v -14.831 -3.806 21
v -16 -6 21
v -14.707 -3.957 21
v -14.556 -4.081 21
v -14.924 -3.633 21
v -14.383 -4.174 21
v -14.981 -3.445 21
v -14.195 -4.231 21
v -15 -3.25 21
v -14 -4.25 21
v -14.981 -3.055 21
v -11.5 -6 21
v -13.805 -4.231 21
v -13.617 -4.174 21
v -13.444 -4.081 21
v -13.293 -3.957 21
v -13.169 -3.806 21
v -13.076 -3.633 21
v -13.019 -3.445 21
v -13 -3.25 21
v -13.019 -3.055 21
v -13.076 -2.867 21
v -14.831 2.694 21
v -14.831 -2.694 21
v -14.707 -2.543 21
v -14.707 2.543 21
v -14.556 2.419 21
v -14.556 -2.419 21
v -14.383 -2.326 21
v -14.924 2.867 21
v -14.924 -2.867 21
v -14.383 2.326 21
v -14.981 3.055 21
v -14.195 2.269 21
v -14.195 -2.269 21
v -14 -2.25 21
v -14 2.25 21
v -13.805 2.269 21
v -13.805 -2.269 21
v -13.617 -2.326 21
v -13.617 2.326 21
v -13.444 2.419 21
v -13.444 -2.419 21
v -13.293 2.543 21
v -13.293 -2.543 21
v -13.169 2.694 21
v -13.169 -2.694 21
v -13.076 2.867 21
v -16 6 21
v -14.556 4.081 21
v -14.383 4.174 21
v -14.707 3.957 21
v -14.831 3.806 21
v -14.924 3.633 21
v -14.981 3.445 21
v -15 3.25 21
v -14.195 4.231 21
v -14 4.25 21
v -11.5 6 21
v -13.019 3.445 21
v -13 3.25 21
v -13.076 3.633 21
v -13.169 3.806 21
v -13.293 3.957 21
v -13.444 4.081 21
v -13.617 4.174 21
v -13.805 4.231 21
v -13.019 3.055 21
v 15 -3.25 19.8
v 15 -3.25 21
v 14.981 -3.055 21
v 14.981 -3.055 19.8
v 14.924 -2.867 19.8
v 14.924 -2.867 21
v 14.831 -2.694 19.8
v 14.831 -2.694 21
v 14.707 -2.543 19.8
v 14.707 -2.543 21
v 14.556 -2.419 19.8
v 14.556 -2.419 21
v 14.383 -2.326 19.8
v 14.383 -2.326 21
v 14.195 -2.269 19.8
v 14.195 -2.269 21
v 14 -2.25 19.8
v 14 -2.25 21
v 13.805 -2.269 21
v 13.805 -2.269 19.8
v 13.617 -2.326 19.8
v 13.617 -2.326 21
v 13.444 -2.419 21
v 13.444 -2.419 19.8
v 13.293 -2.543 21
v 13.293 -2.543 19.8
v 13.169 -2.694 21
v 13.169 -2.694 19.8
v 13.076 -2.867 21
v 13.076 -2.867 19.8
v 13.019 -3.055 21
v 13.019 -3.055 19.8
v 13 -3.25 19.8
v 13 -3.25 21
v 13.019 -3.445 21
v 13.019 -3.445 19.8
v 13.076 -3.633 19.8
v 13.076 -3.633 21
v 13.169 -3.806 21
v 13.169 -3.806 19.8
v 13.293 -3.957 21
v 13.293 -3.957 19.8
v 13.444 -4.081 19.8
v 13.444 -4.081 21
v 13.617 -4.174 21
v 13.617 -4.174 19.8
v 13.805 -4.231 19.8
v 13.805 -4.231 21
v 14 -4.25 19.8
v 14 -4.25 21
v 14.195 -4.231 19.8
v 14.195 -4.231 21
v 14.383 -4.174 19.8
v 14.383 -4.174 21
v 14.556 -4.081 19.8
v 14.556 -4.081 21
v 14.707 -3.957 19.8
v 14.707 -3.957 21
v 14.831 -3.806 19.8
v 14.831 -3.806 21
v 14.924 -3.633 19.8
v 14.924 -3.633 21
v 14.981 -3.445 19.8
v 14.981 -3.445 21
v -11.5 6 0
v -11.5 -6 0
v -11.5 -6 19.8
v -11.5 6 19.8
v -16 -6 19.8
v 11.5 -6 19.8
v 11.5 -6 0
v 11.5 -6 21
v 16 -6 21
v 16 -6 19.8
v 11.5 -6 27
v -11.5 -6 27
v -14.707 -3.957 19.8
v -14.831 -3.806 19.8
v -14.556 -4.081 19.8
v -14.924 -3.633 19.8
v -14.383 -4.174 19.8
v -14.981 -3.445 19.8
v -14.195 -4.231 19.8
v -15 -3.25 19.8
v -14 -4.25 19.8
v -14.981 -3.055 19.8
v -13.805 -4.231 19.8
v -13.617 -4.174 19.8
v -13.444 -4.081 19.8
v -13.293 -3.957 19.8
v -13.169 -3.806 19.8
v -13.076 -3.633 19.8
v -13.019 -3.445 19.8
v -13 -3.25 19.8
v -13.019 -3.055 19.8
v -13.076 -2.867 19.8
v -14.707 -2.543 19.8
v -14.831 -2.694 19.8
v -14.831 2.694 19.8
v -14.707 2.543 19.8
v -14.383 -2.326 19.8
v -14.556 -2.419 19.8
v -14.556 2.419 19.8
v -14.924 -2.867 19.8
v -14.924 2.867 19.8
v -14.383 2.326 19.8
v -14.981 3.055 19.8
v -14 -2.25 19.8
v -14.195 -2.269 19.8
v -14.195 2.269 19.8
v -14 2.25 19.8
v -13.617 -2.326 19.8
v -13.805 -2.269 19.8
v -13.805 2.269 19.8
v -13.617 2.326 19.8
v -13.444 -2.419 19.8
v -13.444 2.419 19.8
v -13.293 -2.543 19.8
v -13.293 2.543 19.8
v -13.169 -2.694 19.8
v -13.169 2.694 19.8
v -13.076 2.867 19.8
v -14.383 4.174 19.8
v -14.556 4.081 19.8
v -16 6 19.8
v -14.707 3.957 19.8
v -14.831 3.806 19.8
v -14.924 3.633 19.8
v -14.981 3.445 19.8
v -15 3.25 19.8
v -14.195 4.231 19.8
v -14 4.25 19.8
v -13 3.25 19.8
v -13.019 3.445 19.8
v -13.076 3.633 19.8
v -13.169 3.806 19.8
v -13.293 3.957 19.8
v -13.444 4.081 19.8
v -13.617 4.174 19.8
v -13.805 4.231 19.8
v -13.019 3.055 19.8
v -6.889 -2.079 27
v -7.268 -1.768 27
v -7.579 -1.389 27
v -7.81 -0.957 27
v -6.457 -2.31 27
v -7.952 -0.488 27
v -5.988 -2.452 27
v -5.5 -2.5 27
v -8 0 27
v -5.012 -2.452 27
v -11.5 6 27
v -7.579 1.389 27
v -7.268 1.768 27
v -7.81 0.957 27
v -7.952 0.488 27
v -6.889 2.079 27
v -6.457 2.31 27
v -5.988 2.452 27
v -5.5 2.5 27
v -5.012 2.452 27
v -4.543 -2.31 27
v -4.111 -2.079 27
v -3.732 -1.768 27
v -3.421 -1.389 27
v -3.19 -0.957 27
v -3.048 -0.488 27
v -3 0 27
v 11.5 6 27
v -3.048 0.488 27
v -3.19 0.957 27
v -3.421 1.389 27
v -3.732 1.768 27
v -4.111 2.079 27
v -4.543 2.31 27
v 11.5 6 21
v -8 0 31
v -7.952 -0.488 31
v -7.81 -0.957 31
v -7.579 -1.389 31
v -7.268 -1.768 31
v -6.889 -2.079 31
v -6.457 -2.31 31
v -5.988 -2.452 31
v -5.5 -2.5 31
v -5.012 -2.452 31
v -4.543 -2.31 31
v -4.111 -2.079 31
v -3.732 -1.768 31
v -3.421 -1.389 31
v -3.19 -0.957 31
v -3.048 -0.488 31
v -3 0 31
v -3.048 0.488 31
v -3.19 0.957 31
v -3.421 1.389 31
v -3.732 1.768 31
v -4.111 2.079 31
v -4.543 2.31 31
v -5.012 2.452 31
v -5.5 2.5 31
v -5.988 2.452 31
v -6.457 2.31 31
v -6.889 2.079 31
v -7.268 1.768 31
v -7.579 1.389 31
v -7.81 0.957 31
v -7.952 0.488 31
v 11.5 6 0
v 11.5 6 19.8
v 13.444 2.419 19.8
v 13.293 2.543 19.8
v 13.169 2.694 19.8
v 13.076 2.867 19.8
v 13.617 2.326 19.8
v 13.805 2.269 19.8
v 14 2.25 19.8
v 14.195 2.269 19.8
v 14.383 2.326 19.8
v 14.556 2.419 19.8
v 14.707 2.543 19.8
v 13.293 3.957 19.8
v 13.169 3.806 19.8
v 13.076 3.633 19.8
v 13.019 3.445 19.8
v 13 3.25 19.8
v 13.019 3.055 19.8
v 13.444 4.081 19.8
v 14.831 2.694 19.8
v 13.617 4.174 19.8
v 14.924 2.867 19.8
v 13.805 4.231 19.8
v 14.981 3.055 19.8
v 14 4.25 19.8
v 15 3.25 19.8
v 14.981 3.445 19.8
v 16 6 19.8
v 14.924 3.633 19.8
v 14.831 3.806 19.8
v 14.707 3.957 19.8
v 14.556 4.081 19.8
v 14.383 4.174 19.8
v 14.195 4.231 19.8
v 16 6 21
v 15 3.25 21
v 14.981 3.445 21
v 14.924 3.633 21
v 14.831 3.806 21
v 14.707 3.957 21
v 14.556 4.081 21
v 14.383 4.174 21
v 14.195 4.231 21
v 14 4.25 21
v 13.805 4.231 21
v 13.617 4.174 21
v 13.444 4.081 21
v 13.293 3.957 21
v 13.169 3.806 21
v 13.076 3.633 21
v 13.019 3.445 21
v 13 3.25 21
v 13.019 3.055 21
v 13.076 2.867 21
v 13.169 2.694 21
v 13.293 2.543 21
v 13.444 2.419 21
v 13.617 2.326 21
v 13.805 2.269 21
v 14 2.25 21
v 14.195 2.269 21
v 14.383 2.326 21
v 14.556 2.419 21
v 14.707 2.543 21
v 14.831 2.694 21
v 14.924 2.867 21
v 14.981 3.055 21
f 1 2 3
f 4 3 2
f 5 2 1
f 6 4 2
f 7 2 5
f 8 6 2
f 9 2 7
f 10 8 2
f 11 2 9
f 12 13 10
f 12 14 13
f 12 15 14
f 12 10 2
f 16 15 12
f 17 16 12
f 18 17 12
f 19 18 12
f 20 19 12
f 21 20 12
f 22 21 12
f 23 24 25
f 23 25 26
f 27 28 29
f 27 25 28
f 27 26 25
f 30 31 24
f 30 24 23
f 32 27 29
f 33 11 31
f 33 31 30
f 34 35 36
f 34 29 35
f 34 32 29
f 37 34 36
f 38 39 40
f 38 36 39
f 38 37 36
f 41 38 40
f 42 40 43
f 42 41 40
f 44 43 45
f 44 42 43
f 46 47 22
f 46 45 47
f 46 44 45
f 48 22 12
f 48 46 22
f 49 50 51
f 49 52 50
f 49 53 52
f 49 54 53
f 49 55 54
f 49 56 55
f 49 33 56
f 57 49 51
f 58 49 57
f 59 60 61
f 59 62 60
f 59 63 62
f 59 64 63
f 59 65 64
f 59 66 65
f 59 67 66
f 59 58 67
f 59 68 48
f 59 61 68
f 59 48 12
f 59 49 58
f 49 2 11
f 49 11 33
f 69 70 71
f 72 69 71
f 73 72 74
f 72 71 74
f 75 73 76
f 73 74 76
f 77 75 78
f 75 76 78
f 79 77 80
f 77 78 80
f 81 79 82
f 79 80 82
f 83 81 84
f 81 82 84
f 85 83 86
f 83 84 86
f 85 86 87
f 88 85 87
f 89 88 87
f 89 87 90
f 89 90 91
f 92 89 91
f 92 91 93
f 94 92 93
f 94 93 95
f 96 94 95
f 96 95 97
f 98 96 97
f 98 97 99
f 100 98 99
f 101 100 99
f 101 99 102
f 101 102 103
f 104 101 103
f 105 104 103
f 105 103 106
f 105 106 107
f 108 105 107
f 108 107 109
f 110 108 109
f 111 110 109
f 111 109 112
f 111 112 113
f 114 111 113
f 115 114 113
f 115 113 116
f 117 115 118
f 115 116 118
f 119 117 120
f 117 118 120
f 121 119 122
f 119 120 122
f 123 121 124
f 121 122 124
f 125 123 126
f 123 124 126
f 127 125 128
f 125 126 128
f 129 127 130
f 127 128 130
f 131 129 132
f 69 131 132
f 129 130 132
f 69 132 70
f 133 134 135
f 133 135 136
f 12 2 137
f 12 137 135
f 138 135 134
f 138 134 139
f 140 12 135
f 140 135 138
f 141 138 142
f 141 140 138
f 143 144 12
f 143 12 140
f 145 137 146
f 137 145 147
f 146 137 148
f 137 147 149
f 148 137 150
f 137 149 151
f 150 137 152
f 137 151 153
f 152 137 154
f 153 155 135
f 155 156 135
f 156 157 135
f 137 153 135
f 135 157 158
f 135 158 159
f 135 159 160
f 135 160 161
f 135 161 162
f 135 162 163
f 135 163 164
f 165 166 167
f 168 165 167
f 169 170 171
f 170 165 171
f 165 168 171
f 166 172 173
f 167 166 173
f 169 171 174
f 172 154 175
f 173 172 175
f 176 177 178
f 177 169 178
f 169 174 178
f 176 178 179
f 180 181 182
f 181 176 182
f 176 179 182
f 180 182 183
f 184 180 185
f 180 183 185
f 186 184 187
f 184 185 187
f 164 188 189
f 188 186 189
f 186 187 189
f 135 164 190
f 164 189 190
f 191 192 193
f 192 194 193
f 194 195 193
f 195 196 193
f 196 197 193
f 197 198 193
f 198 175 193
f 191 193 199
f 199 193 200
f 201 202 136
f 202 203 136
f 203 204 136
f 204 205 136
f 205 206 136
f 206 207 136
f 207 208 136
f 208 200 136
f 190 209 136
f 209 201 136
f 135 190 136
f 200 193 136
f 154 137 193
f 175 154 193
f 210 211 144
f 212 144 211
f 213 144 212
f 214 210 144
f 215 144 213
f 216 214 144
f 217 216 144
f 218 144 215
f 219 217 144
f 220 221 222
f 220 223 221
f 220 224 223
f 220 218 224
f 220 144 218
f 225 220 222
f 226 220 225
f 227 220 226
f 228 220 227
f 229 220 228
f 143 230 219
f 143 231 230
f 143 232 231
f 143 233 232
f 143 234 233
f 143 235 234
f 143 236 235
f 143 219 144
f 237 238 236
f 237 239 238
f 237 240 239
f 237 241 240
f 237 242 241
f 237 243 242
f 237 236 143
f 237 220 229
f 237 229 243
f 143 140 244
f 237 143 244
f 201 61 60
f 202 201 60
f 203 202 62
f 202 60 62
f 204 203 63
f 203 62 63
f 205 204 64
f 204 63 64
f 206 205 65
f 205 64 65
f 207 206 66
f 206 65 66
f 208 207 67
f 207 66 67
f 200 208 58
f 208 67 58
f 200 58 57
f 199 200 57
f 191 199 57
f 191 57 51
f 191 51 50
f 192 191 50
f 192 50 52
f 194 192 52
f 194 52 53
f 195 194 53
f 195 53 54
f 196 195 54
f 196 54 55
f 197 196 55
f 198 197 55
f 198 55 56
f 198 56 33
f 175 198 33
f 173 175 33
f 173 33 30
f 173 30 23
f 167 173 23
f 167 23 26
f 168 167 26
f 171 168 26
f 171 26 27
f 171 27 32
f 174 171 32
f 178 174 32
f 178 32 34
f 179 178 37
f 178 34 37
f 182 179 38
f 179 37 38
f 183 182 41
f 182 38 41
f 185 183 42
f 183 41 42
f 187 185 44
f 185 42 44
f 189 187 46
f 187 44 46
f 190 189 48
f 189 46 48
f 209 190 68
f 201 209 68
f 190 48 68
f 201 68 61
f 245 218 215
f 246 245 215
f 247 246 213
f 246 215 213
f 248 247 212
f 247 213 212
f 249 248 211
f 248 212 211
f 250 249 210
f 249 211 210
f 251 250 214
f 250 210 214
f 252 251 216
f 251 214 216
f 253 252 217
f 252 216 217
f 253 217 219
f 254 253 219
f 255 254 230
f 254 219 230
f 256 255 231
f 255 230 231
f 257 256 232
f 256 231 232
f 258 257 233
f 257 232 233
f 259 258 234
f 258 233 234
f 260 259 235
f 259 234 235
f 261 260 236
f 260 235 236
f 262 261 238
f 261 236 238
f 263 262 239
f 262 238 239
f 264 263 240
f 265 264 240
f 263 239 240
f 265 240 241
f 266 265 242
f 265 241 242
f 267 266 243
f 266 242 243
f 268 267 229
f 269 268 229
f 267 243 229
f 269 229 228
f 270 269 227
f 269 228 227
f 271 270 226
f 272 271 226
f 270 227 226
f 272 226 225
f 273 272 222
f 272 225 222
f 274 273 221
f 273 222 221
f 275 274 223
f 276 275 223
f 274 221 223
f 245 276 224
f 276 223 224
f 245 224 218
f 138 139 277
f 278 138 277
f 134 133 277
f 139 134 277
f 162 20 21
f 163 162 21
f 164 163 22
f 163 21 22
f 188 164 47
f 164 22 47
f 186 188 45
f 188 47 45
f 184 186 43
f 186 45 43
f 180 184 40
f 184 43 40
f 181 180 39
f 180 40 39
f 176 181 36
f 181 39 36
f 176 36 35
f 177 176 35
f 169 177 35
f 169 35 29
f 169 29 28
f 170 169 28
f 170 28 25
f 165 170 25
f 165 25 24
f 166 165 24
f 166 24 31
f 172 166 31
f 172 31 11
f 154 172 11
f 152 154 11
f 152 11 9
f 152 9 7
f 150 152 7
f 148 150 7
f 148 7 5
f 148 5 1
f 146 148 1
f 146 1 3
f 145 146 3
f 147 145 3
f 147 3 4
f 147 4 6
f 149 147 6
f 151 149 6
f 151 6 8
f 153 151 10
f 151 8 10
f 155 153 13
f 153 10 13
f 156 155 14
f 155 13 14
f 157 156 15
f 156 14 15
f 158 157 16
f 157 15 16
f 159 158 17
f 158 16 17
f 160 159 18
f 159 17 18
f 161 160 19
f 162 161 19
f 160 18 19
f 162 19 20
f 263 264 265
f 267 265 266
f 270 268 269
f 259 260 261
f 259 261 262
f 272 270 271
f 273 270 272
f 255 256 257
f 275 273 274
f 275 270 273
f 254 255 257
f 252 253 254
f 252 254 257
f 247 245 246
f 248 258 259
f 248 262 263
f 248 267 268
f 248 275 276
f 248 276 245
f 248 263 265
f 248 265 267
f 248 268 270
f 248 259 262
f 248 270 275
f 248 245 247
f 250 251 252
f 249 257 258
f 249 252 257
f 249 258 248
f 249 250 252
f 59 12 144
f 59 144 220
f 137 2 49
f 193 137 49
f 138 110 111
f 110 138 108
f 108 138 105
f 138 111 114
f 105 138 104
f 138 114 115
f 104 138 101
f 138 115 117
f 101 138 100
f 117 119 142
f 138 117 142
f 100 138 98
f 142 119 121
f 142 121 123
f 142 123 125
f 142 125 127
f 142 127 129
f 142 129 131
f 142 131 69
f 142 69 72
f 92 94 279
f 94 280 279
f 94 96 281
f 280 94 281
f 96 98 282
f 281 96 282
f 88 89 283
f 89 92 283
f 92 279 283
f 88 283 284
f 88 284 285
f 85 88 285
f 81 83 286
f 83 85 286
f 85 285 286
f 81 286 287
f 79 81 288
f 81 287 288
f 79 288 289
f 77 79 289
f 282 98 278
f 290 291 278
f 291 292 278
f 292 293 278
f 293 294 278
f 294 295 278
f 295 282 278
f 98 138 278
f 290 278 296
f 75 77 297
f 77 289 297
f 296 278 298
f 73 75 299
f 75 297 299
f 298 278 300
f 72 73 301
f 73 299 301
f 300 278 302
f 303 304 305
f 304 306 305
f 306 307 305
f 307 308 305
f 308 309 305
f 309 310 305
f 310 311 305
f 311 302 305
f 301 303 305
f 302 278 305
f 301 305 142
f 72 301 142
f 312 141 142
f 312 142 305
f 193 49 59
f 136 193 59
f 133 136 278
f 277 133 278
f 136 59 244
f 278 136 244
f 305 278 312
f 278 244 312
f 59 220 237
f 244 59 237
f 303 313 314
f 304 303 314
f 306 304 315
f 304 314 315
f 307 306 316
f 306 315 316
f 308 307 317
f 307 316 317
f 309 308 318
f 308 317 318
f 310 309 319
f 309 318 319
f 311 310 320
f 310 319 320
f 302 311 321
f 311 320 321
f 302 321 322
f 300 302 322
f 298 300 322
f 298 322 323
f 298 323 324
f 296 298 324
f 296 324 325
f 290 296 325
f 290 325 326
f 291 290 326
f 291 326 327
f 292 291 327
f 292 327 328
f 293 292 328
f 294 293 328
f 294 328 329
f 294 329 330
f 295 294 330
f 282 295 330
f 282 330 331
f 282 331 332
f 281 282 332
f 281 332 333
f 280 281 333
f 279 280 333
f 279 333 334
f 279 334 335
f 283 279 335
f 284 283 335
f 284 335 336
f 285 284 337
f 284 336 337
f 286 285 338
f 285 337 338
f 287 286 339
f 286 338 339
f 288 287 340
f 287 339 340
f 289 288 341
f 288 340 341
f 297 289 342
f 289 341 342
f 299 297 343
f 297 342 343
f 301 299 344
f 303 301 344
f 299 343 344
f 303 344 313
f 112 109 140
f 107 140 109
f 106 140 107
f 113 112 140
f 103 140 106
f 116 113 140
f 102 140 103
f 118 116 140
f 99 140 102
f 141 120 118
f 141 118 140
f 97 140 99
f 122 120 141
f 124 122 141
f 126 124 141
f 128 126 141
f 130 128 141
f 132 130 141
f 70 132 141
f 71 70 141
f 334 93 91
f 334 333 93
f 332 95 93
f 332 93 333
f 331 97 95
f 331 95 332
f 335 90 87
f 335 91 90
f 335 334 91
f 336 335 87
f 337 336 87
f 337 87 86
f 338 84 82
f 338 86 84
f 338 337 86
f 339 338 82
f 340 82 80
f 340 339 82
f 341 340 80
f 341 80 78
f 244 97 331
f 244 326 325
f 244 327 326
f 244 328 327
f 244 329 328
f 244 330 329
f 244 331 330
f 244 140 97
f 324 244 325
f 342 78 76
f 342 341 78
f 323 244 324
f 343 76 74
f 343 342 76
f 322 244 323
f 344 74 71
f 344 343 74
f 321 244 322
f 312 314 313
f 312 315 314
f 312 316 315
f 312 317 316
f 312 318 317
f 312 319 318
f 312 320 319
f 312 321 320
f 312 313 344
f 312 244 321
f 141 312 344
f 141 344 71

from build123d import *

# Parameters (mm, degrees)
SKETCH_2_W          = 23
SKETCH_2_H          = 12
EXTRUDE_1_DEPTH     = 27
EXTRUDE_START       = -6
SKETCH_3_W          = 32
SKETCH_3_H          = 12
EXTRUDE_2_DEPTH     = 1.2
SKETCH_4_R          = 2.5
EXTRUDE_3_DEPTH     = 4
SKETCH_5_R          = 1
CUT_EXTRUDE_1_DEPTH = 4


with BuildPart() as part:
    # 草图2 → 凸台-拉伸1 (new body)
    with BuildSketch(Plane.XY):
        Rectangle(SKETCH_2_W, SKETCH_2_H)
    extrude(amount=EXTRUDE_1_DEPTH)

    # 草图3 → 凸台-拉伸2 (add)
    with BuildSketch(Plane.XY.offset(27).offset(EXTRUDE_START)):
        Rectangle(SKETCH_3_W, SKETCH_3_H)
    extrude(amount=-EXTRUDE_2_DEPTH)

    # 草图4 → 凸台-拉伸3 (add)
    with BuildSketch(Plane.XY.offset(27)):
        with Locations(Location((-5.5, 0, 0), (0, 0, 180))):
            Circle(SKETCH_4_R)
    extrude(amount=EXTRUDE_3_DEPTH)

    # 草图5 → 切除-拉伸1 (cut)
    with BuildSketch(Plane.XY.offset(21)):
        with Locations((14, 3.25)):
            Circle(SKETCH_5_R)
        with Locations((14, -3.25)):
            Circle(SKETCH_5_R)
        with Locations((-14, -3.25)):
            Circle(SKETCH_5_R)
        with Locations((-14, 3.25)):
            Circle(SKETCH_5_R)
    extrude(amount=-CUT_EXTRUDE_1_DEPTH, mode=Mode.SUBTRACT)


solid = part.part
